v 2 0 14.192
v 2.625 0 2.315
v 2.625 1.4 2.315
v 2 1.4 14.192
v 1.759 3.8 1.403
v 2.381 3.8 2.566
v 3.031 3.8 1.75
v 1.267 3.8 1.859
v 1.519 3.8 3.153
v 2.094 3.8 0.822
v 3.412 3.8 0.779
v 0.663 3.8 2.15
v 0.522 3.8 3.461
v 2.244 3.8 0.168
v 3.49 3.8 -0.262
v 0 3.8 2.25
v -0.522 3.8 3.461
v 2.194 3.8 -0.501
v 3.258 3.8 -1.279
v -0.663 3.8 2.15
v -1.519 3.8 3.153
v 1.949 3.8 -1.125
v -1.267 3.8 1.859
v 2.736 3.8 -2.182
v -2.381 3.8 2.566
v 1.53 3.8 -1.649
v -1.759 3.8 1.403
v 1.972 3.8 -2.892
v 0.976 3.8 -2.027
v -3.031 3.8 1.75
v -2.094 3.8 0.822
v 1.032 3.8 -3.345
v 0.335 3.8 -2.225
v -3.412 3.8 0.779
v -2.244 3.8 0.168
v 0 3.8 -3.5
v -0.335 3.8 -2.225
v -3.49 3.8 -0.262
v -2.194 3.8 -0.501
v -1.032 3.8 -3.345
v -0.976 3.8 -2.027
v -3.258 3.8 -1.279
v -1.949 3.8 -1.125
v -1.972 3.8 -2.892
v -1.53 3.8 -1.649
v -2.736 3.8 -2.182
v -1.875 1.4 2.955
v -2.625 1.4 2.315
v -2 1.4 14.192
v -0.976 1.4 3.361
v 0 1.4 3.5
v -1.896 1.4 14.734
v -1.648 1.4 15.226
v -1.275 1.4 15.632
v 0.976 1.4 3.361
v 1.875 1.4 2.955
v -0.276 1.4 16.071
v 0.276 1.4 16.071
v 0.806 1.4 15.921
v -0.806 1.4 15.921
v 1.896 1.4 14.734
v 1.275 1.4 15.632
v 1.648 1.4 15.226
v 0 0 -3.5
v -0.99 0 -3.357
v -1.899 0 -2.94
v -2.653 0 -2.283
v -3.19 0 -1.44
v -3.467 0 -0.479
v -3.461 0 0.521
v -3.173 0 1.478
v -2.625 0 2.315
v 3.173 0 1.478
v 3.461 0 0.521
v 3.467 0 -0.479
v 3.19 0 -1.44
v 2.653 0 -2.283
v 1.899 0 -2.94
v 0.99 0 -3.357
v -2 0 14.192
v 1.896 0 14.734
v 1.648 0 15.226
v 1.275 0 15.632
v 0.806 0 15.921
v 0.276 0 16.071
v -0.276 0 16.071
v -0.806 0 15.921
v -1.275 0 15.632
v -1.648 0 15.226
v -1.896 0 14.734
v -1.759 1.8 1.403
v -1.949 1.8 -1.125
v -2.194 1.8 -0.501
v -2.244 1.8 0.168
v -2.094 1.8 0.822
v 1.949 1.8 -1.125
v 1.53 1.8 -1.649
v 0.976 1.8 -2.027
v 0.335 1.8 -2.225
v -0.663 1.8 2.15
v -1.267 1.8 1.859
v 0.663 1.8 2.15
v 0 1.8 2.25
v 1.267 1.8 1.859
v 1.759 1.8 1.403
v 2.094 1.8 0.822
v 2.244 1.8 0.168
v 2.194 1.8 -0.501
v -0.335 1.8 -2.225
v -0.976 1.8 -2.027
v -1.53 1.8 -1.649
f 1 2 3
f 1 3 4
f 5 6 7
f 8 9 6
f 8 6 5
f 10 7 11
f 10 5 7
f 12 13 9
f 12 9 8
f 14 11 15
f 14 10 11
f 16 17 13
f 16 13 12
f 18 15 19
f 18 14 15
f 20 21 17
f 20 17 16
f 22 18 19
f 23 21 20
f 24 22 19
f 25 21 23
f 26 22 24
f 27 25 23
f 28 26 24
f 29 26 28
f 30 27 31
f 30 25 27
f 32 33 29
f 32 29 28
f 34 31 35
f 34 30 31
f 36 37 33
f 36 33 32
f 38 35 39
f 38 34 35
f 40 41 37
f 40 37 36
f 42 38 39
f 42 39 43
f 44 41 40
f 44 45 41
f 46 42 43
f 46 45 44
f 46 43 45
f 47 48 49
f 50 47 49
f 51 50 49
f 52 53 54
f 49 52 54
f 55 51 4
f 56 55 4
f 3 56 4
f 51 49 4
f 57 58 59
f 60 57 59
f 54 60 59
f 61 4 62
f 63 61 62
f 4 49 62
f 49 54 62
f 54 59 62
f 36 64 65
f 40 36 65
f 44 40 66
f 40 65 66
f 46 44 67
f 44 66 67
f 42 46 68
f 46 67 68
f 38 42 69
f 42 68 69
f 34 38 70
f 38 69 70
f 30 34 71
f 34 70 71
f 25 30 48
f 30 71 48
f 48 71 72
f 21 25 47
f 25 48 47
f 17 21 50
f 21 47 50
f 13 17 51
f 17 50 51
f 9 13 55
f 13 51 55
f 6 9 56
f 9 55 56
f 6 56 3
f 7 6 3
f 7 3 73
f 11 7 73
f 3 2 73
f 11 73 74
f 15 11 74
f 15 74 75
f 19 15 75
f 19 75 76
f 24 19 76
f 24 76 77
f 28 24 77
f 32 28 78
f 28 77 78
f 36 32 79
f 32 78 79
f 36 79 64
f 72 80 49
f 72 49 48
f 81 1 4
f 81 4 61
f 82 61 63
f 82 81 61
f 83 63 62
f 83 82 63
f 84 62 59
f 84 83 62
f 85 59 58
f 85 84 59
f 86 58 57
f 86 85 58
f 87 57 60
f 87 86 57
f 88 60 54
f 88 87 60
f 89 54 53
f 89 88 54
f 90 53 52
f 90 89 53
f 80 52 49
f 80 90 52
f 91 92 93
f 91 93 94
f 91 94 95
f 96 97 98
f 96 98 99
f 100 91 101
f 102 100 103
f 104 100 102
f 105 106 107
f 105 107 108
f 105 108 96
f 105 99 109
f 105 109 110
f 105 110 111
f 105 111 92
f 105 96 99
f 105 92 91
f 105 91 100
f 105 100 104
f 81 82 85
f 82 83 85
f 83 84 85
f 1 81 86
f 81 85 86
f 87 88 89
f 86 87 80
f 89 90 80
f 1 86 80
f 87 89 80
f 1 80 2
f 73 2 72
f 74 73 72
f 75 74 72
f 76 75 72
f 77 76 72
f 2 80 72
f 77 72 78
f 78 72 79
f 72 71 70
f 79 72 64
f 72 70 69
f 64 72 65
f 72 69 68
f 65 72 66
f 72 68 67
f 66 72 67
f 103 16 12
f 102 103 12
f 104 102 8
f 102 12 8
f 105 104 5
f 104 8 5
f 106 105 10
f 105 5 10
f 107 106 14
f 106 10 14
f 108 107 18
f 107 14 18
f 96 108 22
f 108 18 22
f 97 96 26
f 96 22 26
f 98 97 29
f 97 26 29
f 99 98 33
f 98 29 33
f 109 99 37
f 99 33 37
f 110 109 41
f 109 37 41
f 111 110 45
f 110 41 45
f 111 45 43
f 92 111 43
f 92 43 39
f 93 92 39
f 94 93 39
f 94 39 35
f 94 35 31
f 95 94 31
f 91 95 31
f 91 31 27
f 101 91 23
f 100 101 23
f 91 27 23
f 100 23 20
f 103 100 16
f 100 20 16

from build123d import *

# Parameters (mm, degrees)
SKETCH1_R           = 3.5
BOSS_EXTRUDE1_DEPTH = 3.8
BOSS_EXTRUDE2_DEPTH = 1.4
SKETCH3_R           = 2.25
CUT_EXTRUDE1_DEPTH  = 2


with BuildPart() as part:
    # Sketch1 → Boss-Extrude1 (new body)
    with BuildSketch(Plane(origin=(0, 0, 0), x_dir=(1, 0, 0), z_dir=(0, 1, 0))):
        with Locations(Location((0, 0, 0), (0, 0, 90))):
            Circle(SKETCH1_R)
    extrude(amount=BOSS_EXTRUDE1_DEPTH)

    # Sketch2 → Boss-Extrude2 (add)
    with BuildSketch(Plane.XZ):
        with BuildLine():
            Line((-2, 14.192474485), (-2.625, 2.315032397))
            ThreePointArc((-2.625, 2.315032397), (0, 3.5), (2.625, 2.315032397))
            Line((2.625, 2.315032397), (2, 14.192474485))
            ThreePointArc((2, 14.192474485), (0, 16.09), (-2, 14.192474485))
        make_face()
    extrude(amount=-BOSS_EXTRUDE2_DEPTH)

    # Sketch3 → Cut-Extrude1 (cut)
    with BuildSketch(Plane(origin=(0, 3.8, 0), x_dir=(1, 0, 0), z_dir=(0, 1, 0))):
        with Locations(Location((0, 0, 0), (0, 0, 270))):
            Circle(SKETCH3_R)
    extrude(amount=-CUT_EXTRUDE1_DEPTH, mode=Mode.SUBTRACT)


solid = part.part
